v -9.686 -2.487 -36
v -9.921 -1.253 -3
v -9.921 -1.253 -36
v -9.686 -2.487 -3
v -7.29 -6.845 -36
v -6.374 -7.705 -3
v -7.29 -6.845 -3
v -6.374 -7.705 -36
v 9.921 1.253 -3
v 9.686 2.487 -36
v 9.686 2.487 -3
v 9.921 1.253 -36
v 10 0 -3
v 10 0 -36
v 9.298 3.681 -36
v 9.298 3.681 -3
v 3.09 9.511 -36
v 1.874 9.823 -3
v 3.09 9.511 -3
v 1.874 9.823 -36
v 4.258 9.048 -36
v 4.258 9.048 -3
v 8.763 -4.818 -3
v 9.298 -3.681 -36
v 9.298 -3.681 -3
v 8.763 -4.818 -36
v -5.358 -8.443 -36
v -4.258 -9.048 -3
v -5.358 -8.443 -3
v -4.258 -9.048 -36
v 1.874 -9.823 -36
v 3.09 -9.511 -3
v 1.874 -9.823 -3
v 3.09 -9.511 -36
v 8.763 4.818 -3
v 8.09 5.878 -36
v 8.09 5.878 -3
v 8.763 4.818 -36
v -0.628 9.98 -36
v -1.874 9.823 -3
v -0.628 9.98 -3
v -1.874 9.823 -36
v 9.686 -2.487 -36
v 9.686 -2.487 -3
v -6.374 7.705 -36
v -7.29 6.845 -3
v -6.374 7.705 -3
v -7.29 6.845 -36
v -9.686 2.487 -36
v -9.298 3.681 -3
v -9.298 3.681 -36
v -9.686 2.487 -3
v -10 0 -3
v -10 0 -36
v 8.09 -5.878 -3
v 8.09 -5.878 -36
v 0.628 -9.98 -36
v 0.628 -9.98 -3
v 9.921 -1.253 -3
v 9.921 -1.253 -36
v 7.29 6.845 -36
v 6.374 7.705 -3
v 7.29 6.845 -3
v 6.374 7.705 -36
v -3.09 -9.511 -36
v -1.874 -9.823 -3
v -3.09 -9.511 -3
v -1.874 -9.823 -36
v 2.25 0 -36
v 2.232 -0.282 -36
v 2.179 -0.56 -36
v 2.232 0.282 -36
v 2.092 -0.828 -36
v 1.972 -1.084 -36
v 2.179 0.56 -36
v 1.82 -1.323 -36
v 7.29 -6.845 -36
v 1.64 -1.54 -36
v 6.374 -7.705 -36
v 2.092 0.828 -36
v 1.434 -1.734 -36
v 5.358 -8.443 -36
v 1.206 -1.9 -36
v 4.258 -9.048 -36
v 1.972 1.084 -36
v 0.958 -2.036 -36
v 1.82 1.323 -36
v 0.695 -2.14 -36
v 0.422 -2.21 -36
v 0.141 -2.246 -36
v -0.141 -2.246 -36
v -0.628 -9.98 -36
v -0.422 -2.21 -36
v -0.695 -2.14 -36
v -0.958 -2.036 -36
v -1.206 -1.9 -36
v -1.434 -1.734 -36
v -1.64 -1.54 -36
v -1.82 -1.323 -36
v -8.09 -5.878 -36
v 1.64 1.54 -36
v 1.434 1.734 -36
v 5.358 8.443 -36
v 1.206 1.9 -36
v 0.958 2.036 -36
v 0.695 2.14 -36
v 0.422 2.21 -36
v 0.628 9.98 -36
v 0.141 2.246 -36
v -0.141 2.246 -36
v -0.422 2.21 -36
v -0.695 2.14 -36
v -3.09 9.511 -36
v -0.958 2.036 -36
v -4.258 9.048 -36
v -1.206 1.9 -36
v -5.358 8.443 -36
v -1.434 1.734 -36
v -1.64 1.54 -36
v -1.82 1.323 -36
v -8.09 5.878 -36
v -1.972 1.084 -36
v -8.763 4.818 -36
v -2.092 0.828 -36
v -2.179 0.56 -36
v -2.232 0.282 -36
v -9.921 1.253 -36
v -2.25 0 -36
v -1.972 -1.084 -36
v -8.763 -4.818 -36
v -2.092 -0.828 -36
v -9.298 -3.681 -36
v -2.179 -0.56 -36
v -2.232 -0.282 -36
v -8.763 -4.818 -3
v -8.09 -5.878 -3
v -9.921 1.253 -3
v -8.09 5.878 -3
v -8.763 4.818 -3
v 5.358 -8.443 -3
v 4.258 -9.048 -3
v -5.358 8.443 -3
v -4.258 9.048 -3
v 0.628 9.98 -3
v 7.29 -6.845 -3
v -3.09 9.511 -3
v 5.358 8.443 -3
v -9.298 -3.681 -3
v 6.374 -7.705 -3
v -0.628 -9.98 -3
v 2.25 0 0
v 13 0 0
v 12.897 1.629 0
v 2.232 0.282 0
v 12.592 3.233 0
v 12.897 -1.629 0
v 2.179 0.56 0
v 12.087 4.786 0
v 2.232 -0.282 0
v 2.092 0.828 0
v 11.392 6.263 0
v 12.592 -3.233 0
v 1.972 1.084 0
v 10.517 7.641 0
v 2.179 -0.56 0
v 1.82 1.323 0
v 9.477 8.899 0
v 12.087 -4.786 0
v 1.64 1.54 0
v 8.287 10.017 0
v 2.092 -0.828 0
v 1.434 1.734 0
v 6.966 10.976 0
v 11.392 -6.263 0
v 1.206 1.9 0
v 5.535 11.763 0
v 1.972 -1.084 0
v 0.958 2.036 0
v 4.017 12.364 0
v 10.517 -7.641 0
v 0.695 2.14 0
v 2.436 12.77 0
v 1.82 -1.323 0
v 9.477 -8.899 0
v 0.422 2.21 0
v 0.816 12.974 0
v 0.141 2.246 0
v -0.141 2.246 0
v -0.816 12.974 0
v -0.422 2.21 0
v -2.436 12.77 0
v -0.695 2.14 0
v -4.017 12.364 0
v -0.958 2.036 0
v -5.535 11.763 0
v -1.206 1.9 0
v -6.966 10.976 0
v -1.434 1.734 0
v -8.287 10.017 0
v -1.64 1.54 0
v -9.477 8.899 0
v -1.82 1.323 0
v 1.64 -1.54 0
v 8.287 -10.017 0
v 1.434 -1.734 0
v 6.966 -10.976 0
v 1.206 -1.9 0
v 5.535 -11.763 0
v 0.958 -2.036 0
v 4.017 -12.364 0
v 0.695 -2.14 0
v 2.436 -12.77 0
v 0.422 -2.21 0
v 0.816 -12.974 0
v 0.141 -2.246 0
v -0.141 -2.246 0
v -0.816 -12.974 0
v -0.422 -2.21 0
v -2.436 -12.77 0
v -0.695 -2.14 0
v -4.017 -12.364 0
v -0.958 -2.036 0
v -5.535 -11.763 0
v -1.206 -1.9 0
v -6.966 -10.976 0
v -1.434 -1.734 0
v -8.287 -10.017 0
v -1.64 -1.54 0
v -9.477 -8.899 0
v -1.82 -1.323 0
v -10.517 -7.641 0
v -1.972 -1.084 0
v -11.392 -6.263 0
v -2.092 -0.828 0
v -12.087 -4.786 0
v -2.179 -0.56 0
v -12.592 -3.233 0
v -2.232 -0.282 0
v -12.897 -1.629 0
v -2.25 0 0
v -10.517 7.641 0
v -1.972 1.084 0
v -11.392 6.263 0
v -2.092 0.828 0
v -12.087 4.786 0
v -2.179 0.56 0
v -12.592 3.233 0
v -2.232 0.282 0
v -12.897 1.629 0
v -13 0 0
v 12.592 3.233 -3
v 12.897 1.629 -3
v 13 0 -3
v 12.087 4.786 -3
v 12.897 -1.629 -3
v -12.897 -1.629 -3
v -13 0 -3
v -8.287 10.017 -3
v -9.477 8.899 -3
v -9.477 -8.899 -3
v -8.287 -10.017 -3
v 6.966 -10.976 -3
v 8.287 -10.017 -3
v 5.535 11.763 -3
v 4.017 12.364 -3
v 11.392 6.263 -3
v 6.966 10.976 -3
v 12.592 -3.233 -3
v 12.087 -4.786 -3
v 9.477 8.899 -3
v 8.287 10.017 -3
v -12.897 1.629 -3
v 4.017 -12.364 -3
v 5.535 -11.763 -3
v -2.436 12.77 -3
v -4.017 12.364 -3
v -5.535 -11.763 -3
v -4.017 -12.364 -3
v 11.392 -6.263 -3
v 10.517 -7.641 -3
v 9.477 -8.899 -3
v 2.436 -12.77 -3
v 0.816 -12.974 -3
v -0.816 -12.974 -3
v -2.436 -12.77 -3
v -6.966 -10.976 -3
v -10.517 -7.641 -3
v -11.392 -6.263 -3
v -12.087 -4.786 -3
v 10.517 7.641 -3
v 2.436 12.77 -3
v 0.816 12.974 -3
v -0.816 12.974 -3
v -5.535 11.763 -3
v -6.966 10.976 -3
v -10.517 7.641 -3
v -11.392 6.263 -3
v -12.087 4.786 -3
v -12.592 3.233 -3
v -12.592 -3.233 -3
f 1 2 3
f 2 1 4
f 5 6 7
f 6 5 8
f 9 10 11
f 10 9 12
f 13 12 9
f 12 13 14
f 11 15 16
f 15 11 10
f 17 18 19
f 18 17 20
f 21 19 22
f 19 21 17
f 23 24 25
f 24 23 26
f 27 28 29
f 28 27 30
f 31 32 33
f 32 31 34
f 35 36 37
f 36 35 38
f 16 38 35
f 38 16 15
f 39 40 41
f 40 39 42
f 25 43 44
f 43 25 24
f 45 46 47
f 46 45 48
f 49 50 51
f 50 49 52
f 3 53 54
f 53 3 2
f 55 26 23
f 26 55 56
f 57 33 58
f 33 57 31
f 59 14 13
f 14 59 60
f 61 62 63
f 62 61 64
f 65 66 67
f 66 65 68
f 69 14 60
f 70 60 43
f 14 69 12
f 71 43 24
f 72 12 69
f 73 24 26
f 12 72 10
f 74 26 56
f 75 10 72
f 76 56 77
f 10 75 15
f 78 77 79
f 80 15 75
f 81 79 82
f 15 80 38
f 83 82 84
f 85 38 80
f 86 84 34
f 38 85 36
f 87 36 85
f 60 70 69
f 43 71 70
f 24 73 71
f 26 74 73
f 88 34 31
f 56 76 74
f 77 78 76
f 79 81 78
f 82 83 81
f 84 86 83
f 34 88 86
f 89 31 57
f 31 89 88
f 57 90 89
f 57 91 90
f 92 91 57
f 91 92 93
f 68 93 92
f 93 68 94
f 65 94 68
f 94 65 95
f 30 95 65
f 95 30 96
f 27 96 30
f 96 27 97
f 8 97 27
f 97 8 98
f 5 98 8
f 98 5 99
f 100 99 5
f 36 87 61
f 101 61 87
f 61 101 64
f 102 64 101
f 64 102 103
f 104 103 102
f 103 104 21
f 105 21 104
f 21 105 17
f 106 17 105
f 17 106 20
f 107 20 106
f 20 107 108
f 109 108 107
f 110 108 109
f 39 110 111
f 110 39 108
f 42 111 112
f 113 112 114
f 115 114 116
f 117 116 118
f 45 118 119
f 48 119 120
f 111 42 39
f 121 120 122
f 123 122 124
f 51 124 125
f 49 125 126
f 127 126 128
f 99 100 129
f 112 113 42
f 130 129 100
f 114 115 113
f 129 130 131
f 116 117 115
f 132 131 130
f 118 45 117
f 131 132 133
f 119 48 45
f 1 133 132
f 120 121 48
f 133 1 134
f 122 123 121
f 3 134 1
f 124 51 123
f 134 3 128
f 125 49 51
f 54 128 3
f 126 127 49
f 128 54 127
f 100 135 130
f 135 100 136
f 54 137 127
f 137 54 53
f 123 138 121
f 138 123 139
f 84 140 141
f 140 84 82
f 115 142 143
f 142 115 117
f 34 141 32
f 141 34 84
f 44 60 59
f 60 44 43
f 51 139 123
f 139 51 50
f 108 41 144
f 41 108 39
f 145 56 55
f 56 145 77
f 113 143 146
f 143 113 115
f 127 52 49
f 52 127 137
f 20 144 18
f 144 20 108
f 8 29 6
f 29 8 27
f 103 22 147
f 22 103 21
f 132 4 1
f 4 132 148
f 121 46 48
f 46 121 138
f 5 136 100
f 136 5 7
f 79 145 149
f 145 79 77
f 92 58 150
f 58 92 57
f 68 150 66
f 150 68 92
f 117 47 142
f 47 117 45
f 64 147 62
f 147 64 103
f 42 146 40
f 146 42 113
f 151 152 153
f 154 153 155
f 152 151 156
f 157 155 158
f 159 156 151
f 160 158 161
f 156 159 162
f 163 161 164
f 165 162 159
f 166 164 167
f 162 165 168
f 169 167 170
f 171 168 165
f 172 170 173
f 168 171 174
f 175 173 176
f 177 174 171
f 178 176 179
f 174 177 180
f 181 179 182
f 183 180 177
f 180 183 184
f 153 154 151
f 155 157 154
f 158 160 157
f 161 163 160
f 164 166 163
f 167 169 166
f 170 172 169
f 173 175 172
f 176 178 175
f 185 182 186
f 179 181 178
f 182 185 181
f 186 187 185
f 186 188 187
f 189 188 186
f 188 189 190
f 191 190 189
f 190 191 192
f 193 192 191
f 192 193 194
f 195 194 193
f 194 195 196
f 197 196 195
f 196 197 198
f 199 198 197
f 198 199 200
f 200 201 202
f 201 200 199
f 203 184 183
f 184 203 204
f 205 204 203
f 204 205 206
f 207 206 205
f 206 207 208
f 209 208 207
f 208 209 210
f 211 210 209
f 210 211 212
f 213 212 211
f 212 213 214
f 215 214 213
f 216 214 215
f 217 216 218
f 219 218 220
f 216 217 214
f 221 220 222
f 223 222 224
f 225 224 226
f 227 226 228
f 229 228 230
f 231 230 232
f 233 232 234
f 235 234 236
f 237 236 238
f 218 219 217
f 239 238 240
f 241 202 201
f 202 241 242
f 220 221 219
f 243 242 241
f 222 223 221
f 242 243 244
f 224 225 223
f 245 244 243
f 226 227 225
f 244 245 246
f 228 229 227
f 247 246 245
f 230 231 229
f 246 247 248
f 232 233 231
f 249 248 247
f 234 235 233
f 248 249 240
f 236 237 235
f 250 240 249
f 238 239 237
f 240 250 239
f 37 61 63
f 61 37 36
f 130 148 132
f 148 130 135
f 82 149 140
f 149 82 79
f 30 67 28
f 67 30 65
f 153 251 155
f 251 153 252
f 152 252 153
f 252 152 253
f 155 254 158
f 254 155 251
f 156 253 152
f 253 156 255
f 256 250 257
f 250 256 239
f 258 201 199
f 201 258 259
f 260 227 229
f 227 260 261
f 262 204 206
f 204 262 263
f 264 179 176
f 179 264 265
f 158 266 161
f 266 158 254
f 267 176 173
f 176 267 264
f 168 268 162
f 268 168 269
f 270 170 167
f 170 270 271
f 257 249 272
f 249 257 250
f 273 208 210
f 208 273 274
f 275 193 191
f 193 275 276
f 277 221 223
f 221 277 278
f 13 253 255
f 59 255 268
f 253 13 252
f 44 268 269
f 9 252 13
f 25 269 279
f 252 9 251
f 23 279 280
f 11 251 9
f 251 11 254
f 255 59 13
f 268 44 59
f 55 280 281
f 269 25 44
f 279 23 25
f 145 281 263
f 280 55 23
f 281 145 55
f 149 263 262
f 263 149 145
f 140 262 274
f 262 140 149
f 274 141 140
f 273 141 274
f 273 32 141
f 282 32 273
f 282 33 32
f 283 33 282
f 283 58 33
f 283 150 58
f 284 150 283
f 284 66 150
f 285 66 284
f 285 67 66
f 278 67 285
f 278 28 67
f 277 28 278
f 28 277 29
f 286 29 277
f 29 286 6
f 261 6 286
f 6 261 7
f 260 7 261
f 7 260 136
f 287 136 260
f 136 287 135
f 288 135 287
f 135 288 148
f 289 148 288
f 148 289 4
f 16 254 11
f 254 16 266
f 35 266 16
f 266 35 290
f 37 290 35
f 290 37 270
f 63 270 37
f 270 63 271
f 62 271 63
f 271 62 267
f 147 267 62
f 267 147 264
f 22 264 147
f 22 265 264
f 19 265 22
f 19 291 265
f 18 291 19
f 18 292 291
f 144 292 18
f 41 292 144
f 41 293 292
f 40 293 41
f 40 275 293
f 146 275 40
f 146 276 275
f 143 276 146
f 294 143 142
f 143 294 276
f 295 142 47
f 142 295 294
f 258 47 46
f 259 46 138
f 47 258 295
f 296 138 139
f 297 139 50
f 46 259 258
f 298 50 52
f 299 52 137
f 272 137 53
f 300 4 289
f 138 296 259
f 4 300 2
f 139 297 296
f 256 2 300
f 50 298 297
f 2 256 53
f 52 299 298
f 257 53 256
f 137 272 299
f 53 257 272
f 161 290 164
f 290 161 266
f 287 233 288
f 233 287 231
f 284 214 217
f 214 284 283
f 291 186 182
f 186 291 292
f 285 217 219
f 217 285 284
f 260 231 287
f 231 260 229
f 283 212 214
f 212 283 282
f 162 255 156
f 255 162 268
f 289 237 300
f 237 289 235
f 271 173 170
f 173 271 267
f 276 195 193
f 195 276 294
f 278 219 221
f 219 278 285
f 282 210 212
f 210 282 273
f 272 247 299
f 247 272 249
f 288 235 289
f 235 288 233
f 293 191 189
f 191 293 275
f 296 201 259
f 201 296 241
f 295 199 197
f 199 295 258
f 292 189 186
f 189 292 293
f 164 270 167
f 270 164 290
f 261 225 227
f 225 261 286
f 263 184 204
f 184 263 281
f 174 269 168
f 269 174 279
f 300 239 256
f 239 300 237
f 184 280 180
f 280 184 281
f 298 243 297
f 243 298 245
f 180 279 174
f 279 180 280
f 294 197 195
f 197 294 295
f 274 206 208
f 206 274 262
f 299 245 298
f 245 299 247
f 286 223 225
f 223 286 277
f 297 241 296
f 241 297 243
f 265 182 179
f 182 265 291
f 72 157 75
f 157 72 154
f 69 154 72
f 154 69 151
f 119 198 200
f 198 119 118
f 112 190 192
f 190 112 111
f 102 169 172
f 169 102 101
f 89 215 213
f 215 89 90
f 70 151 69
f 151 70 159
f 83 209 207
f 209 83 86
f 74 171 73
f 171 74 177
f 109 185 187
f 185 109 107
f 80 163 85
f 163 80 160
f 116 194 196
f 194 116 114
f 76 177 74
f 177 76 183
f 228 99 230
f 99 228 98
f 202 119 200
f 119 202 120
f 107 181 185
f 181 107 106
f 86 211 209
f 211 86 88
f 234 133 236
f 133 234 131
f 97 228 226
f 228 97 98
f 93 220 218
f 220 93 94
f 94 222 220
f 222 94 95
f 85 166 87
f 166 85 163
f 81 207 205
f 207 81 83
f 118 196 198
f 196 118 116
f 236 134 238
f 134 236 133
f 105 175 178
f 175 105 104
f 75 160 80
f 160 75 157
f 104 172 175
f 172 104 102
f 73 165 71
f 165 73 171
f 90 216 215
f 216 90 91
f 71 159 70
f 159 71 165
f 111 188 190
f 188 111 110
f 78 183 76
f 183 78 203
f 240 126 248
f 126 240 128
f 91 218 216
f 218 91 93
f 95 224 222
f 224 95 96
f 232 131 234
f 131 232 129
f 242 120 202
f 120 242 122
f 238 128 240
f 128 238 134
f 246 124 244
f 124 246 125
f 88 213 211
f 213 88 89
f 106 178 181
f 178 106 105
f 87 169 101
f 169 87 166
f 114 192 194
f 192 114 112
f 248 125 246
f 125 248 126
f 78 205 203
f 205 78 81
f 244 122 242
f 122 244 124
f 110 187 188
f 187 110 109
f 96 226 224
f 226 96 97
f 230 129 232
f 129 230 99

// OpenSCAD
$fn = 50;


difference() {
	union() {
		translate(v = [0, 0, -36.0000000000]) {
			cylinder(h = 36, r = 10.0000000000);
		}
		translate(v = [0, 0, -3.0000000000]) {
			cylinder(h = 3, r = 13.0000000000);
		}
	}
	union() {
		#translate(v = [0, 0, -36]) {
			cylinder(h = 36, r = 2.2500000000);
		}
	}
}
